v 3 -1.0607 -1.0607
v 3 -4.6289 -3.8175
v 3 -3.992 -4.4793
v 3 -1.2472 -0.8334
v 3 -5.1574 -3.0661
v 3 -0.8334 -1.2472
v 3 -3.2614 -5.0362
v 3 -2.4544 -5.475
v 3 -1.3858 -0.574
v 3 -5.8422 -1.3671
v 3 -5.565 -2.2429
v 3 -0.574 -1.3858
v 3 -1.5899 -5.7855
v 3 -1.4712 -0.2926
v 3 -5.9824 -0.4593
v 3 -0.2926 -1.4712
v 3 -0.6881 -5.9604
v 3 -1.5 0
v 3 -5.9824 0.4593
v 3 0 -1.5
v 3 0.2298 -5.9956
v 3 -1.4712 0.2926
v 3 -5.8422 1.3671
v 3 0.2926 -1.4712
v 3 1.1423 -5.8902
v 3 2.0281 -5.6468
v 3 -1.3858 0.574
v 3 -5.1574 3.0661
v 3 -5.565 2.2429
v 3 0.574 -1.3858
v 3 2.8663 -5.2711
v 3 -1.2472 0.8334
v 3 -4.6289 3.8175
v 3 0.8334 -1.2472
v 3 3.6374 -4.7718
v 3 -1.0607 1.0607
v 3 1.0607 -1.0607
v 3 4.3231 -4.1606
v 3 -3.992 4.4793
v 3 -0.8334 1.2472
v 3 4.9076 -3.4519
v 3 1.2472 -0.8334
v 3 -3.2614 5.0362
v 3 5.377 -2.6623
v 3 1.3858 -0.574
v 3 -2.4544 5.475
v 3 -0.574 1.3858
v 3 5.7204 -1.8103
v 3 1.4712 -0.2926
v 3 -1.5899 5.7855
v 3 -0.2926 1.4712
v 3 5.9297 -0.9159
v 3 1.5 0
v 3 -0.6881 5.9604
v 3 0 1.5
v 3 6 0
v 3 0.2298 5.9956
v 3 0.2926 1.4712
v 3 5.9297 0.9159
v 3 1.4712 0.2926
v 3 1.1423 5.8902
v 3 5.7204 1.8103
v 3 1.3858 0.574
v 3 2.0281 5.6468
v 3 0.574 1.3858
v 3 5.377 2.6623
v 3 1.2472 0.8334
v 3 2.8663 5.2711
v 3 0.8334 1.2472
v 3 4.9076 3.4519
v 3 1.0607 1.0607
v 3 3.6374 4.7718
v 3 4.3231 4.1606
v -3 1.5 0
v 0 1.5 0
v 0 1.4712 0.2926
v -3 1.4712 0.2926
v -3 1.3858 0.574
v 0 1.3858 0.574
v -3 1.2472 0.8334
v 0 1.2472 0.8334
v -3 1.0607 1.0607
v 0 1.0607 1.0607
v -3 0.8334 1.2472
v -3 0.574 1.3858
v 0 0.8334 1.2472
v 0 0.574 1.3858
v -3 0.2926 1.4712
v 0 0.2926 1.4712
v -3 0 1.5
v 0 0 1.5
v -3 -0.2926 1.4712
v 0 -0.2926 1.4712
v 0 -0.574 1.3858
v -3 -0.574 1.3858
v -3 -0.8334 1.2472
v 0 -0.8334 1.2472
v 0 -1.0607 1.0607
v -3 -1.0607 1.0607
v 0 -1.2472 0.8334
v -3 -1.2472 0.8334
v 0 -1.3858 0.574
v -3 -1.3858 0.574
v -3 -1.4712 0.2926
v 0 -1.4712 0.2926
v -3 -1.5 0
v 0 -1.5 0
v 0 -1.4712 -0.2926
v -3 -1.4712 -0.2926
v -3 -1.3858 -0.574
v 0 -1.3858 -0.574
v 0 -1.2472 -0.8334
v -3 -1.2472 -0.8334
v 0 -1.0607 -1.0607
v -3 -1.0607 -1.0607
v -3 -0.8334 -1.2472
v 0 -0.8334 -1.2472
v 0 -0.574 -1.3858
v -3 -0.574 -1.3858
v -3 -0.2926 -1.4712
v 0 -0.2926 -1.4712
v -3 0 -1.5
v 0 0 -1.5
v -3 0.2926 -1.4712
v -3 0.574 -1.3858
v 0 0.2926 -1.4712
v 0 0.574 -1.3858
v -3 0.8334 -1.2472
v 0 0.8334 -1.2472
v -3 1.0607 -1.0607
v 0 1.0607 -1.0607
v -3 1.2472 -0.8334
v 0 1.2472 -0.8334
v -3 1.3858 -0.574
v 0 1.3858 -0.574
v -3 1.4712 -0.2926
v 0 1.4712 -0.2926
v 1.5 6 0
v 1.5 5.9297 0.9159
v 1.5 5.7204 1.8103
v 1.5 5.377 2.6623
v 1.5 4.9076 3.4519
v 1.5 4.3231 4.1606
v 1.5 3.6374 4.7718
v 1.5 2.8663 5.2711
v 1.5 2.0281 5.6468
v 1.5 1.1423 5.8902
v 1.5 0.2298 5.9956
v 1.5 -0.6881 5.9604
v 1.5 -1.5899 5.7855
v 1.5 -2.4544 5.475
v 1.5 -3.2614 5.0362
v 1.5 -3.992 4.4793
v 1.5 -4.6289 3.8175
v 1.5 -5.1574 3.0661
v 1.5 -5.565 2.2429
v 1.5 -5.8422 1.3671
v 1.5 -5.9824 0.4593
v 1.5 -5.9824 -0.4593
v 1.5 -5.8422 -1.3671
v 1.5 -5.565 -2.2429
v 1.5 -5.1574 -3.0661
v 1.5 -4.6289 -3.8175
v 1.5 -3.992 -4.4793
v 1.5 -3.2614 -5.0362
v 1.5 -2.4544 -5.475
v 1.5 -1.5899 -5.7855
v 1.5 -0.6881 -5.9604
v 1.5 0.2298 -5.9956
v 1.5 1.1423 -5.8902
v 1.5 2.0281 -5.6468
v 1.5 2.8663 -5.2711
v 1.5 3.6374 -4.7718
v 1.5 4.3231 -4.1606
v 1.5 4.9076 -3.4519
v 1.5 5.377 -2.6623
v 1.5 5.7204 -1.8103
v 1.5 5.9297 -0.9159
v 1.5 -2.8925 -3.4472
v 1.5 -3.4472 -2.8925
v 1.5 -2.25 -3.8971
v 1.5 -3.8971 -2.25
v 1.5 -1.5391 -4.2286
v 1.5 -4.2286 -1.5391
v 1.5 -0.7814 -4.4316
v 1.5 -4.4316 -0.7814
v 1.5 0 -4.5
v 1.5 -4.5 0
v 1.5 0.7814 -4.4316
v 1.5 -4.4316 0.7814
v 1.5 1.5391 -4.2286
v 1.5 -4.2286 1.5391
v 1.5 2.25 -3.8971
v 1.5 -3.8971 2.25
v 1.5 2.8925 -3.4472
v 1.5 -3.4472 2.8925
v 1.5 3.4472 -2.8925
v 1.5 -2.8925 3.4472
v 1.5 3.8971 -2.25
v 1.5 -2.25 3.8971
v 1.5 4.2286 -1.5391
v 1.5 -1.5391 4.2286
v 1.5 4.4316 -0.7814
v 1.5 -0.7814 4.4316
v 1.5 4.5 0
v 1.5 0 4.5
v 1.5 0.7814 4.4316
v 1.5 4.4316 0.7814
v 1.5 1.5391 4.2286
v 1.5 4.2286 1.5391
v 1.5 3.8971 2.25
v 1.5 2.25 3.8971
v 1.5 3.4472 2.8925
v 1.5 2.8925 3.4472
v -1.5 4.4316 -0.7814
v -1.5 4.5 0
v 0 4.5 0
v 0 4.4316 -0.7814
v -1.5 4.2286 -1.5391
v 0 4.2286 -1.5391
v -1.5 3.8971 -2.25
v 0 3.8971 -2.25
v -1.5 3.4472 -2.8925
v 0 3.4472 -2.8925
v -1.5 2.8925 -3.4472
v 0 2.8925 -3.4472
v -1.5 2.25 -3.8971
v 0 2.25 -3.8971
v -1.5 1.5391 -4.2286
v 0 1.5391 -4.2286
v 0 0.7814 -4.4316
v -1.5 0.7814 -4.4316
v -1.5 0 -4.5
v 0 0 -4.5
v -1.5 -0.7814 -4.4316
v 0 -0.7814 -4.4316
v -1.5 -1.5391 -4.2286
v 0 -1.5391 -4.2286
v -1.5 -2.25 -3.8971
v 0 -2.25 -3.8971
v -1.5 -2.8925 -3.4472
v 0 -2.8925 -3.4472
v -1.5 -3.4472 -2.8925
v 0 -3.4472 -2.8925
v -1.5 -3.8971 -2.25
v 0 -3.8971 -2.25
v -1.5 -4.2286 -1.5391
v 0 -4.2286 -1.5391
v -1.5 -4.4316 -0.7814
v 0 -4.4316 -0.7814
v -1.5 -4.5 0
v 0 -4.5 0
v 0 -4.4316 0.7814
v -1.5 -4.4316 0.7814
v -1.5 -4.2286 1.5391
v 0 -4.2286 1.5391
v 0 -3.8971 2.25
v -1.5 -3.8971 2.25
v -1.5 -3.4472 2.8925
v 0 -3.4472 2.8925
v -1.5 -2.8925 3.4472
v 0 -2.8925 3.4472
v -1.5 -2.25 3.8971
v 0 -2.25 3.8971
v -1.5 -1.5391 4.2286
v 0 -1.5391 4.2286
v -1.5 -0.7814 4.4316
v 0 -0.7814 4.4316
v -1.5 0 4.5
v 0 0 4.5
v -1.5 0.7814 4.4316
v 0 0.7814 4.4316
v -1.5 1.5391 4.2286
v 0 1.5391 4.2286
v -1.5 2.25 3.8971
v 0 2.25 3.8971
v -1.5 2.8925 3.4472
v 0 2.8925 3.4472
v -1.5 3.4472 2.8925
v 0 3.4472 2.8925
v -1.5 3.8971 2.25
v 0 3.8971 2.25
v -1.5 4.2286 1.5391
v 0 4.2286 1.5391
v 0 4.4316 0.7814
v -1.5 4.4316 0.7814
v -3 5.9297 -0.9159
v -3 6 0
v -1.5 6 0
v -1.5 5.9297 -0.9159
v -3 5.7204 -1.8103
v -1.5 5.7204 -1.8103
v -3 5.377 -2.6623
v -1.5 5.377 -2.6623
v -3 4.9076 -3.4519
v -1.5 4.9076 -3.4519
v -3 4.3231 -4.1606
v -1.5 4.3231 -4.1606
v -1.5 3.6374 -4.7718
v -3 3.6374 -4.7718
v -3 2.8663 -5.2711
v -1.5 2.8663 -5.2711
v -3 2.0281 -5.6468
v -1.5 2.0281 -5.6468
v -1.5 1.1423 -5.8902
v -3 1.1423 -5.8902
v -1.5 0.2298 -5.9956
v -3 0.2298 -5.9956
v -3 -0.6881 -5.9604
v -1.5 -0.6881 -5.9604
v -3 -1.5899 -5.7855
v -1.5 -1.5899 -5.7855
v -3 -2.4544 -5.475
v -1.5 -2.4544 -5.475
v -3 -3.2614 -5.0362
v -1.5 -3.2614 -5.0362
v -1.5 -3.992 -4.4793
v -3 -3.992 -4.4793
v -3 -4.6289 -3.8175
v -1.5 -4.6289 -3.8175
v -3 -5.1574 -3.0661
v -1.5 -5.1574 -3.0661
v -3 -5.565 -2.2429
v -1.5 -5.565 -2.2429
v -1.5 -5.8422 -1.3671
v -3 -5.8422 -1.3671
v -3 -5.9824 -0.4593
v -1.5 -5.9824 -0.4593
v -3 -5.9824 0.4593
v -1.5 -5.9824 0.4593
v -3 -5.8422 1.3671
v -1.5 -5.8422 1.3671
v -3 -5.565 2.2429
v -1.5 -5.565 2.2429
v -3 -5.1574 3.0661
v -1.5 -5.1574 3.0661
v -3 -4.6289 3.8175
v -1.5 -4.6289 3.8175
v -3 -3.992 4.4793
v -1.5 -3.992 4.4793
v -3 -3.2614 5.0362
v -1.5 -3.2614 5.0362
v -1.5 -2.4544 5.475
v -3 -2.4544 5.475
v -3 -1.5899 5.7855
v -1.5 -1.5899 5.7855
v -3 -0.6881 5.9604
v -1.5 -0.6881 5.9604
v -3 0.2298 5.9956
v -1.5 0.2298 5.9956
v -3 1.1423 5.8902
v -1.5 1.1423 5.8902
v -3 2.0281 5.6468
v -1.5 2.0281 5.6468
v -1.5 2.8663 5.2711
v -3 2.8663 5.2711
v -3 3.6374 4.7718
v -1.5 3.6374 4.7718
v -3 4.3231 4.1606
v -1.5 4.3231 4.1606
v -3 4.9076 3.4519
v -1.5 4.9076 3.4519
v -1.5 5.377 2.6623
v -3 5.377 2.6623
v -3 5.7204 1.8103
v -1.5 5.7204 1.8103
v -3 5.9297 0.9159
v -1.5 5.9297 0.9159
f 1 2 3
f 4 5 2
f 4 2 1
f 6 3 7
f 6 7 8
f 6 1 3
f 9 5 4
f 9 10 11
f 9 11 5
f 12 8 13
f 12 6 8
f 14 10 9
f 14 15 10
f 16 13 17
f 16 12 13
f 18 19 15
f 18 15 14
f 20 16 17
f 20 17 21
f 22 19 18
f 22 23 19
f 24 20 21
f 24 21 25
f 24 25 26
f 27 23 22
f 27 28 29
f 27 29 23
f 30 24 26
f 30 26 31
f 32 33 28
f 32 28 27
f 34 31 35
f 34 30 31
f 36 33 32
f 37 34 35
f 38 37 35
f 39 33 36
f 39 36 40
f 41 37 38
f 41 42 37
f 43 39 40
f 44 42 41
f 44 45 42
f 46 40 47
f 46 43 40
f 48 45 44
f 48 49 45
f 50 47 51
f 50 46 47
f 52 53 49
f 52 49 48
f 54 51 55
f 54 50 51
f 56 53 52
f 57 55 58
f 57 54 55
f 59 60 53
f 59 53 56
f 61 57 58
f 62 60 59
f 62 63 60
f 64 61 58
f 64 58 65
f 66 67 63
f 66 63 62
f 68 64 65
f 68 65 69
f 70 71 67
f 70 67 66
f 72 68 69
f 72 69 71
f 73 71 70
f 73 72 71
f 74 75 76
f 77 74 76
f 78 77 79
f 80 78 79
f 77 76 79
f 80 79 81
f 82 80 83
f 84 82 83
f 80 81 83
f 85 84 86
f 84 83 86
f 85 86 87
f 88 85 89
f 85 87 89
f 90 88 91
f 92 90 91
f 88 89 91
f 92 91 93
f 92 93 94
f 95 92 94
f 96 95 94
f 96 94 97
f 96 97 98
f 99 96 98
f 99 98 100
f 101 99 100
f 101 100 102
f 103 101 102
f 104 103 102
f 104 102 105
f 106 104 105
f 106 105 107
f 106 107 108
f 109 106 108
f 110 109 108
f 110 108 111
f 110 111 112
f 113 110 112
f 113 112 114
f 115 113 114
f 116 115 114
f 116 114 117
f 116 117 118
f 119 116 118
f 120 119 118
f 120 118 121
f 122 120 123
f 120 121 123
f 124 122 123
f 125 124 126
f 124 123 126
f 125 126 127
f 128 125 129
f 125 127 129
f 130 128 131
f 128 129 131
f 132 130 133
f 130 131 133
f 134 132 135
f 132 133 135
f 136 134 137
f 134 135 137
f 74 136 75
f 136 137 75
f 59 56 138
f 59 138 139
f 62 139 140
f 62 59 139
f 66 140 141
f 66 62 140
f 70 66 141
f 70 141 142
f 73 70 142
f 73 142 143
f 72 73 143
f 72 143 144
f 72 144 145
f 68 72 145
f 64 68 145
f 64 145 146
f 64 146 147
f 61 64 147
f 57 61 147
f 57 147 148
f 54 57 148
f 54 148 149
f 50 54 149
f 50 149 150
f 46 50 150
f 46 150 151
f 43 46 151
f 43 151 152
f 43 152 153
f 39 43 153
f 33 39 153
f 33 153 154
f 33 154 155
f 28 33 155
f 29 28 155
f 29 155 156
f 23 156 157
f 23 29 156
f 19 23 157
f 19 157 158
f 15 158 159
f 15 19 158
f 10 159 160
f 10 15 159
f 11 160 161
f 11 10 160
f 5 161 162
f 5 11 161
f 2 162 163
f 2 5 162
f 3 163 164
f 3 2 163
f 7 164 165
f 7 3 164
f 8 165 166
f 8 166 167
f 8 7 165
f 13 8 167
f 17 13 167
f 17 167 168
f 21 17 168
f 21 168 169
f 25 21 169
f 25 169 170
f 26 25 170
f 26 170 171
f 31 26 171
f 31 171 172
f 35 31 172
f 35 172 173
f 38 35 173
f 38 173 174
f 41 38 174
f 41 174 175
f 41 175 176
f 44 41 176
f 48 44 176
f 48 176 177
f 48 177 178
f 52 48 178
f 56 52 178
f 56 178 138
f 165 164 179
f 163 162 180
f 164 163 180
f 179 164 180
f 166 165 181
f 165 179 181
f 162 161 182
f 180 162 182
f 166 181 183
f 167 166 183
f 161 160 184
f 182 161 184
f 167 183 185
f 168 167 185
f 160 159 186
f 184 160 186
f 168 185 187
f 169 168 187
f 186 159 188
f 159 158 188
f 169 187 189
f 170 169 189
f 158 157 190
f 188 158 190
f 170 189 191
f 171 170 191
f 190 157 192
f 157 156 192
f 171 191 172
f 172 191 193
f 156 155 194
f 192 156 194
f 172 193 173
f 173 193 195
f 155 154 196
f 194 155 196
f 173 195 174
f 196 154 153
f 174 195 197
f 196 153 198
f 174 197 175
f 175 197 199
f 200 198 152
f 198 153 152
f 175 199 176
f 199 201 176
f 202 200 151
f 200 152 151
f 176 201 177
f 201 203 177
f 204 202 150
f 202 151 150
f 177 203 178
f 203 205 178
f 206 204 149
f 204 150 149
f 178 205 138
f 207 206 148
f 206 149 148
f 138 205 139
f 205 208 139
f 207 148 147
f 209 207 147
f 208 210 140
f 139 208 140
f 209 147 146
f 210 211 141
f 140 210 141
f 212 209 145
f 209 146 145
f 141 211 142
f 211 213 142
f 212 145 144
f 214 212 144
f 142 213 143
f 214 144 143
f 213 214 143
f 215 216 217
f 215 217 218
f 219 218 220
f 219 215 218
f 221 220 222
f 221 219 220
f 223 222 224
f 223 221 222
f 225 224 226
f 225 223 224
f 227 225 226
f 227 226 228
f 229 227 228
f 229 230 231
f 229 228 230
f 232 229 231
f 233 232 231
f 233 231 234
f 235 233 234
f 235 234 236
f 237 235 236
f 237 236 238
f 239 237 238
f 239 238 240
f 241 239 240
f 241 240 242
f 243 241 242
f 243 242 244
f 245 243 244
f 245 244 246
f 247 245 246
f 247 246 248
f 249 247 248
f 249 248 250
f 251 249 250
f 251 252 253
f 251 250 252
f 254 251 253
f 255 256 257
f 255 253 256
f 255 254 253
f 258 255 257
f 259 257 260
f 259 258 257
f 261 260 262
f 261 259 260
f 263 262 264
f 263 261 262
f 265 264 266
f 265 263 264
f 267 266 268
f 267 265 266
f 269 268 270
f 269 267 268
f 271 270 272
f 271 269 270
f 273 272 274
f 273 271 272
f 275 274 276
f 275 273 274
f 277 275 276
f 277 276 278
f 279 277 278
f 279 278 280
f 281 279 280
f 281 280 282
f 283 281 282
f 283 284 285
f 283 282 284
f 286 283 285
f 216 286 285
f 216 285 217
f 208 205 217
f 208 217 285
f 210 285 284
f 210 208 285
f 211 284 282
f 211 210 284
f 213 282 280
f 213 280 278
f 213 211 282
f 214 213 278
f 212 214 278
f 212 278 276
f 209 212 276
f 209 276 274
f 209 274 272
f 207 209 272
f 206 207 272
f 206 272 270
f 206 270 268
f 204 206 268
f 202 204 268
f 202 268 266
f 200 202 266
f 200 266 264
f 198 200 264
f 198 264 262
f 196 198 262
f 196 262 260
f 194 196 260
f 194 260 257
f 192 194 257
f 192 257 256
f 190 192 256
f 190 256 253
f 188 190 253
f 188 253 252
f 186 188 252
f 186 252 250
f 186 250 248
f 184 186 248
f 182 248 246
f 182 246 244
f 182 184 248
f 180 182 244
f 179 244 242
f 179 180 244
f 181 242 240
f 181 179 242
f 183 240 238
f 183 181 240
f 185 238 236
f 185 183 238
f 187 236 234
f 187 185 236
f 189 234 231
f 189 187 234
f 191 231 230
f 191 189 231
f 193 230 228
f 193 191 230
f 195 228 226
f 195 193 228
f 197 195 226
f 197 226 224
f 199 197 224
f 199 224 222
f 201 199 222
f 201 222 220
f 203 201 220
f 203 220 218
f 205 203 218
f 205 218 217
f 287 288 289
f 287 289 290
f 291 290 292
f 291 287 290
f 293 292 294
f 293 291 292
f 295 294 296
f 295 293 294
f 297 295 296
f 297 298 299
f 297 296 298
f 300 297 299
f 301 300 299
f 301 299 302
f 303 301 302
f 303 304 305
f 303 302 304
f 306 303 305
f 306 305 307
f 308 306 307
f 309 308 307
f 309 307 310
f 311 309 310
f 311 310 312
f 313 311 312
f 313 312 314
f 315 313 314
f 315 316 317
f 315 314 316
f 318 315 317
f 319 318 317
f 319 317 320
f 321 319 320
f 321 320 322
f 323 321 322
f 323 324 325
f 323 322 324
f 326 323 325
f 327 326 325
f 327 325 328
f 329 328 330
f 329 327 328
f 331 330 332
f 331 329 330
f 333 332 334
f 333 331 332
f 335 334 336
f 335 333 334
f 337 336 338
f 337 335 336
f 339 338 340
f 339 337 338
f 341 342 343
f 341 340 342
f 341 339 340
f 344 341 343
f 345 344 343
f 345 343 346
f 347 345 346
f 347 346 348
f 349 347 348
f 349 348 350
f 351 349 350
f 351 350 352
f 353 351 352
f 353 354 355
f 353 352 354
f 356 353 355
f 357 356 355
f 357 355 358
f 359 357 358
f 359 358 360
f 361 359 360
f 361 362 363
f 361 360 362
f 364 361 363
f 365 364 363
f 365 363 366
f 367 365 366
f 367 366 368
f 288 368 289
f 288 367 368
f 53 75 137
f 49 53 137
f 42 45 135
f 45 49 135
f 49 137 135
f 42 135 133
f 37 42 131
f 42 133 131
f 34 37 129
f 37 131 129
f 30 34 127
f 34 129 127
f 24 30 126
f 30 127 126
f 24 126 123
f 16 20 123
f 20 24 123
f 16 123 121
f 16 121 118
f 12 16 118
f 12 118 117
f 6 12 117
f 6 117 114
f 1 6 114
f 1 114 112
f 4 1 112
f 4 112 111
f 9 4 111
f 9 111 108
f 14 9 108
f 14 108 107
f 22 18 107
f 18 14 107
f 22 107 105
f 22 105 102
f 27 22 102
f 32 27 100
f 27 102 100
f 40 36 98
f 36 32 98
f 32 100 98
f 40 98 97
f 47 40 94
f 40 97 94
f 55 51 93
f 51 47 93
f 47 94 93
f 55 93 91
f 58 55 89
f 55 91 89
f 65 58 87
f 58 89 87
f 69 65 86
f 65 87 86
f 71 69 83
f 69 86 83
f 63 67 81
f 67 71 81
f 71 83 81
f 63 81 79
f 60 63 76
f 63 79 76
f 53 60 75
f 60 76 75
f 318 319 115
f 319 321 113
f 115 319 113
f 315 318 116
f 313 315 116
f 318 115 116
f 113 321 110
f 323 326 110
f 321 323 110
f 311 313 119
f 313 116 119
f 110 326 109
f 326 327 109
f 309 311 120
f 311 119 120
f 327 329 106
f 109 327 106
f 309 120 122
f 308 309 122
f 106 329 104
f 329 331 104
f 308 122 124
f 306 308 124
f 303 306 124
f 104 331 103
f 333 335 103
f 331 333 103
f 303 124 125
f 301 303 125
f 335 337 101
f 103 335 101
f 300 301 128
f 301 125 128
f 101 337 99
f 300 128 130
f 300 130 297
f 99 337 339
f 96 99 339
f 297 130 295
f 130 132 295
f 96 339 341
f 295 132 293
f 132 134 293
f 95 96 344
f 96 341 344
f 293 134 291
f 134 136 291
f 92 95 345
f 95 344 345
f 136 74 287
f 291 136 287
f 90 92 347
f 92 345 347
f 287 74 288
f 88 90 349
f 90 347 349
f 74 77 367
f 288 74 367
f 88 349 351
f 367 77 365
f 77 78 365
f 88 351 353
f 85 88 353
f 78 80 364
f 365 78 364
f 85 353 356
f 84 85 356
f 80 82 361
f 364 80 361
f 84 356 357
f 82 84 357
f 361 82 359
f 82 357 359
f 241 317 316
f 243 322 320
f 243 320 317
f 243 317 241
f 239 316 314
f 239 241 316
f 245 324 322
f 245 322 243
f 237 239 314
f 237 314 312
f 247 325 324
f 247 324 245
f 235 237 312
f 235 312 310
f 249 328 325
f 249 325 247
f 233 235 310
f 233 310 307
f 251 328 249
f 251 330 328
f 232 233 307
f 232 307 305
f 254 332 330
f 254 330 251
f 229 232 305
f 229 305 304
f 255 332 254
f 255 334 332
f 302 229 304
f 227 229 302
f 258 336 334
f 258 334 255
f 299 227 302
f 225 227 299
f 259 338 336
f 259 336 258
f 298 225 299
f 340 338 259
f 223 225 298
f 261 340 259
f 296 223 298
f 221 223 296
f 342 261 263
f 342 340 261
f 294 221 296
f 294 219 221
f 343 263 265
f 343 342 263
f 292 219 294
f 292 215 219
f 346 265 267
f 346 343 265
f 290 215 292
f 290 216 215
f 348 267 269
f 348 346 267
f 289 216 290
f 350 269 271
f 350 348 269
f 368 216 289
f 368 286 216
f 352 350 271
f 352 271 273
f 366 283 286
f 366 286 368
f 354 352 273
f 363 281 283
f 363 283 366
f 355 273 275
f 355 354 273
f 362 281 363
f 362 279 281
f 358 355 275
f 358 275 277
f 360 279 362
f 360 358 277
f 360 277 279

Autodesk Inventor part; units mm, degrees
ref_plane "YZ Plane" through (0, 0, 0) normal (1, 0, 0) x (0, 1, 0)
ref_plane "XZ Plane" through (0, 0, 0) normal (0, 1, 0) x (-1, 0, 0)
ref_plane "XY Plane" through (0, 0, 0) normal (0, 0, 1) x (1, 0, 0)
sketch "スケッチ1" plane through (0, 0, 0) normal (0, 0, 1) x (1, 0, 0)
  line L0 (0, 4.5) -> (1.5, 4.5)
  line L1 (1.5, 4.5) -> (1.5, 6)
  line L2 (1.5, 6) -> (3, 6)
  line L3 (3, 6) -> (3, 1.5)
  line L4 (3, 1.5) -> (0, 1.5)
  line L5 (0, -1.2) -> (0, 7.2) construction
  line L6 (0, 4.5) -> (-1.5, 4.5)
  line L7 (-1.5, 4.5) -> (-1.5, 6)
  line L8 (-1.5, 6) -> (-3, 6)
  line L9 (-3, 6) -> (-3, 1.5)
  line L10 (-3, 1.5) -> (0, 1.5)
  line L11 (-4.2, 0) -> (4.2, 0) projected
  point P0 (0, 0)
  dimension "d0" = 1.5
  dimension "d1" = 4.5
  dimension "d2" = 1.5
  dimension "d3" = 1.5
  dimension "d4" = 1.5
revolve "回転1" add sketch "スケッチ1" angle 360 about axis through (-10, 0, 0) along (1, 0, 0)
properties part number "Pulley_D3_P10"
